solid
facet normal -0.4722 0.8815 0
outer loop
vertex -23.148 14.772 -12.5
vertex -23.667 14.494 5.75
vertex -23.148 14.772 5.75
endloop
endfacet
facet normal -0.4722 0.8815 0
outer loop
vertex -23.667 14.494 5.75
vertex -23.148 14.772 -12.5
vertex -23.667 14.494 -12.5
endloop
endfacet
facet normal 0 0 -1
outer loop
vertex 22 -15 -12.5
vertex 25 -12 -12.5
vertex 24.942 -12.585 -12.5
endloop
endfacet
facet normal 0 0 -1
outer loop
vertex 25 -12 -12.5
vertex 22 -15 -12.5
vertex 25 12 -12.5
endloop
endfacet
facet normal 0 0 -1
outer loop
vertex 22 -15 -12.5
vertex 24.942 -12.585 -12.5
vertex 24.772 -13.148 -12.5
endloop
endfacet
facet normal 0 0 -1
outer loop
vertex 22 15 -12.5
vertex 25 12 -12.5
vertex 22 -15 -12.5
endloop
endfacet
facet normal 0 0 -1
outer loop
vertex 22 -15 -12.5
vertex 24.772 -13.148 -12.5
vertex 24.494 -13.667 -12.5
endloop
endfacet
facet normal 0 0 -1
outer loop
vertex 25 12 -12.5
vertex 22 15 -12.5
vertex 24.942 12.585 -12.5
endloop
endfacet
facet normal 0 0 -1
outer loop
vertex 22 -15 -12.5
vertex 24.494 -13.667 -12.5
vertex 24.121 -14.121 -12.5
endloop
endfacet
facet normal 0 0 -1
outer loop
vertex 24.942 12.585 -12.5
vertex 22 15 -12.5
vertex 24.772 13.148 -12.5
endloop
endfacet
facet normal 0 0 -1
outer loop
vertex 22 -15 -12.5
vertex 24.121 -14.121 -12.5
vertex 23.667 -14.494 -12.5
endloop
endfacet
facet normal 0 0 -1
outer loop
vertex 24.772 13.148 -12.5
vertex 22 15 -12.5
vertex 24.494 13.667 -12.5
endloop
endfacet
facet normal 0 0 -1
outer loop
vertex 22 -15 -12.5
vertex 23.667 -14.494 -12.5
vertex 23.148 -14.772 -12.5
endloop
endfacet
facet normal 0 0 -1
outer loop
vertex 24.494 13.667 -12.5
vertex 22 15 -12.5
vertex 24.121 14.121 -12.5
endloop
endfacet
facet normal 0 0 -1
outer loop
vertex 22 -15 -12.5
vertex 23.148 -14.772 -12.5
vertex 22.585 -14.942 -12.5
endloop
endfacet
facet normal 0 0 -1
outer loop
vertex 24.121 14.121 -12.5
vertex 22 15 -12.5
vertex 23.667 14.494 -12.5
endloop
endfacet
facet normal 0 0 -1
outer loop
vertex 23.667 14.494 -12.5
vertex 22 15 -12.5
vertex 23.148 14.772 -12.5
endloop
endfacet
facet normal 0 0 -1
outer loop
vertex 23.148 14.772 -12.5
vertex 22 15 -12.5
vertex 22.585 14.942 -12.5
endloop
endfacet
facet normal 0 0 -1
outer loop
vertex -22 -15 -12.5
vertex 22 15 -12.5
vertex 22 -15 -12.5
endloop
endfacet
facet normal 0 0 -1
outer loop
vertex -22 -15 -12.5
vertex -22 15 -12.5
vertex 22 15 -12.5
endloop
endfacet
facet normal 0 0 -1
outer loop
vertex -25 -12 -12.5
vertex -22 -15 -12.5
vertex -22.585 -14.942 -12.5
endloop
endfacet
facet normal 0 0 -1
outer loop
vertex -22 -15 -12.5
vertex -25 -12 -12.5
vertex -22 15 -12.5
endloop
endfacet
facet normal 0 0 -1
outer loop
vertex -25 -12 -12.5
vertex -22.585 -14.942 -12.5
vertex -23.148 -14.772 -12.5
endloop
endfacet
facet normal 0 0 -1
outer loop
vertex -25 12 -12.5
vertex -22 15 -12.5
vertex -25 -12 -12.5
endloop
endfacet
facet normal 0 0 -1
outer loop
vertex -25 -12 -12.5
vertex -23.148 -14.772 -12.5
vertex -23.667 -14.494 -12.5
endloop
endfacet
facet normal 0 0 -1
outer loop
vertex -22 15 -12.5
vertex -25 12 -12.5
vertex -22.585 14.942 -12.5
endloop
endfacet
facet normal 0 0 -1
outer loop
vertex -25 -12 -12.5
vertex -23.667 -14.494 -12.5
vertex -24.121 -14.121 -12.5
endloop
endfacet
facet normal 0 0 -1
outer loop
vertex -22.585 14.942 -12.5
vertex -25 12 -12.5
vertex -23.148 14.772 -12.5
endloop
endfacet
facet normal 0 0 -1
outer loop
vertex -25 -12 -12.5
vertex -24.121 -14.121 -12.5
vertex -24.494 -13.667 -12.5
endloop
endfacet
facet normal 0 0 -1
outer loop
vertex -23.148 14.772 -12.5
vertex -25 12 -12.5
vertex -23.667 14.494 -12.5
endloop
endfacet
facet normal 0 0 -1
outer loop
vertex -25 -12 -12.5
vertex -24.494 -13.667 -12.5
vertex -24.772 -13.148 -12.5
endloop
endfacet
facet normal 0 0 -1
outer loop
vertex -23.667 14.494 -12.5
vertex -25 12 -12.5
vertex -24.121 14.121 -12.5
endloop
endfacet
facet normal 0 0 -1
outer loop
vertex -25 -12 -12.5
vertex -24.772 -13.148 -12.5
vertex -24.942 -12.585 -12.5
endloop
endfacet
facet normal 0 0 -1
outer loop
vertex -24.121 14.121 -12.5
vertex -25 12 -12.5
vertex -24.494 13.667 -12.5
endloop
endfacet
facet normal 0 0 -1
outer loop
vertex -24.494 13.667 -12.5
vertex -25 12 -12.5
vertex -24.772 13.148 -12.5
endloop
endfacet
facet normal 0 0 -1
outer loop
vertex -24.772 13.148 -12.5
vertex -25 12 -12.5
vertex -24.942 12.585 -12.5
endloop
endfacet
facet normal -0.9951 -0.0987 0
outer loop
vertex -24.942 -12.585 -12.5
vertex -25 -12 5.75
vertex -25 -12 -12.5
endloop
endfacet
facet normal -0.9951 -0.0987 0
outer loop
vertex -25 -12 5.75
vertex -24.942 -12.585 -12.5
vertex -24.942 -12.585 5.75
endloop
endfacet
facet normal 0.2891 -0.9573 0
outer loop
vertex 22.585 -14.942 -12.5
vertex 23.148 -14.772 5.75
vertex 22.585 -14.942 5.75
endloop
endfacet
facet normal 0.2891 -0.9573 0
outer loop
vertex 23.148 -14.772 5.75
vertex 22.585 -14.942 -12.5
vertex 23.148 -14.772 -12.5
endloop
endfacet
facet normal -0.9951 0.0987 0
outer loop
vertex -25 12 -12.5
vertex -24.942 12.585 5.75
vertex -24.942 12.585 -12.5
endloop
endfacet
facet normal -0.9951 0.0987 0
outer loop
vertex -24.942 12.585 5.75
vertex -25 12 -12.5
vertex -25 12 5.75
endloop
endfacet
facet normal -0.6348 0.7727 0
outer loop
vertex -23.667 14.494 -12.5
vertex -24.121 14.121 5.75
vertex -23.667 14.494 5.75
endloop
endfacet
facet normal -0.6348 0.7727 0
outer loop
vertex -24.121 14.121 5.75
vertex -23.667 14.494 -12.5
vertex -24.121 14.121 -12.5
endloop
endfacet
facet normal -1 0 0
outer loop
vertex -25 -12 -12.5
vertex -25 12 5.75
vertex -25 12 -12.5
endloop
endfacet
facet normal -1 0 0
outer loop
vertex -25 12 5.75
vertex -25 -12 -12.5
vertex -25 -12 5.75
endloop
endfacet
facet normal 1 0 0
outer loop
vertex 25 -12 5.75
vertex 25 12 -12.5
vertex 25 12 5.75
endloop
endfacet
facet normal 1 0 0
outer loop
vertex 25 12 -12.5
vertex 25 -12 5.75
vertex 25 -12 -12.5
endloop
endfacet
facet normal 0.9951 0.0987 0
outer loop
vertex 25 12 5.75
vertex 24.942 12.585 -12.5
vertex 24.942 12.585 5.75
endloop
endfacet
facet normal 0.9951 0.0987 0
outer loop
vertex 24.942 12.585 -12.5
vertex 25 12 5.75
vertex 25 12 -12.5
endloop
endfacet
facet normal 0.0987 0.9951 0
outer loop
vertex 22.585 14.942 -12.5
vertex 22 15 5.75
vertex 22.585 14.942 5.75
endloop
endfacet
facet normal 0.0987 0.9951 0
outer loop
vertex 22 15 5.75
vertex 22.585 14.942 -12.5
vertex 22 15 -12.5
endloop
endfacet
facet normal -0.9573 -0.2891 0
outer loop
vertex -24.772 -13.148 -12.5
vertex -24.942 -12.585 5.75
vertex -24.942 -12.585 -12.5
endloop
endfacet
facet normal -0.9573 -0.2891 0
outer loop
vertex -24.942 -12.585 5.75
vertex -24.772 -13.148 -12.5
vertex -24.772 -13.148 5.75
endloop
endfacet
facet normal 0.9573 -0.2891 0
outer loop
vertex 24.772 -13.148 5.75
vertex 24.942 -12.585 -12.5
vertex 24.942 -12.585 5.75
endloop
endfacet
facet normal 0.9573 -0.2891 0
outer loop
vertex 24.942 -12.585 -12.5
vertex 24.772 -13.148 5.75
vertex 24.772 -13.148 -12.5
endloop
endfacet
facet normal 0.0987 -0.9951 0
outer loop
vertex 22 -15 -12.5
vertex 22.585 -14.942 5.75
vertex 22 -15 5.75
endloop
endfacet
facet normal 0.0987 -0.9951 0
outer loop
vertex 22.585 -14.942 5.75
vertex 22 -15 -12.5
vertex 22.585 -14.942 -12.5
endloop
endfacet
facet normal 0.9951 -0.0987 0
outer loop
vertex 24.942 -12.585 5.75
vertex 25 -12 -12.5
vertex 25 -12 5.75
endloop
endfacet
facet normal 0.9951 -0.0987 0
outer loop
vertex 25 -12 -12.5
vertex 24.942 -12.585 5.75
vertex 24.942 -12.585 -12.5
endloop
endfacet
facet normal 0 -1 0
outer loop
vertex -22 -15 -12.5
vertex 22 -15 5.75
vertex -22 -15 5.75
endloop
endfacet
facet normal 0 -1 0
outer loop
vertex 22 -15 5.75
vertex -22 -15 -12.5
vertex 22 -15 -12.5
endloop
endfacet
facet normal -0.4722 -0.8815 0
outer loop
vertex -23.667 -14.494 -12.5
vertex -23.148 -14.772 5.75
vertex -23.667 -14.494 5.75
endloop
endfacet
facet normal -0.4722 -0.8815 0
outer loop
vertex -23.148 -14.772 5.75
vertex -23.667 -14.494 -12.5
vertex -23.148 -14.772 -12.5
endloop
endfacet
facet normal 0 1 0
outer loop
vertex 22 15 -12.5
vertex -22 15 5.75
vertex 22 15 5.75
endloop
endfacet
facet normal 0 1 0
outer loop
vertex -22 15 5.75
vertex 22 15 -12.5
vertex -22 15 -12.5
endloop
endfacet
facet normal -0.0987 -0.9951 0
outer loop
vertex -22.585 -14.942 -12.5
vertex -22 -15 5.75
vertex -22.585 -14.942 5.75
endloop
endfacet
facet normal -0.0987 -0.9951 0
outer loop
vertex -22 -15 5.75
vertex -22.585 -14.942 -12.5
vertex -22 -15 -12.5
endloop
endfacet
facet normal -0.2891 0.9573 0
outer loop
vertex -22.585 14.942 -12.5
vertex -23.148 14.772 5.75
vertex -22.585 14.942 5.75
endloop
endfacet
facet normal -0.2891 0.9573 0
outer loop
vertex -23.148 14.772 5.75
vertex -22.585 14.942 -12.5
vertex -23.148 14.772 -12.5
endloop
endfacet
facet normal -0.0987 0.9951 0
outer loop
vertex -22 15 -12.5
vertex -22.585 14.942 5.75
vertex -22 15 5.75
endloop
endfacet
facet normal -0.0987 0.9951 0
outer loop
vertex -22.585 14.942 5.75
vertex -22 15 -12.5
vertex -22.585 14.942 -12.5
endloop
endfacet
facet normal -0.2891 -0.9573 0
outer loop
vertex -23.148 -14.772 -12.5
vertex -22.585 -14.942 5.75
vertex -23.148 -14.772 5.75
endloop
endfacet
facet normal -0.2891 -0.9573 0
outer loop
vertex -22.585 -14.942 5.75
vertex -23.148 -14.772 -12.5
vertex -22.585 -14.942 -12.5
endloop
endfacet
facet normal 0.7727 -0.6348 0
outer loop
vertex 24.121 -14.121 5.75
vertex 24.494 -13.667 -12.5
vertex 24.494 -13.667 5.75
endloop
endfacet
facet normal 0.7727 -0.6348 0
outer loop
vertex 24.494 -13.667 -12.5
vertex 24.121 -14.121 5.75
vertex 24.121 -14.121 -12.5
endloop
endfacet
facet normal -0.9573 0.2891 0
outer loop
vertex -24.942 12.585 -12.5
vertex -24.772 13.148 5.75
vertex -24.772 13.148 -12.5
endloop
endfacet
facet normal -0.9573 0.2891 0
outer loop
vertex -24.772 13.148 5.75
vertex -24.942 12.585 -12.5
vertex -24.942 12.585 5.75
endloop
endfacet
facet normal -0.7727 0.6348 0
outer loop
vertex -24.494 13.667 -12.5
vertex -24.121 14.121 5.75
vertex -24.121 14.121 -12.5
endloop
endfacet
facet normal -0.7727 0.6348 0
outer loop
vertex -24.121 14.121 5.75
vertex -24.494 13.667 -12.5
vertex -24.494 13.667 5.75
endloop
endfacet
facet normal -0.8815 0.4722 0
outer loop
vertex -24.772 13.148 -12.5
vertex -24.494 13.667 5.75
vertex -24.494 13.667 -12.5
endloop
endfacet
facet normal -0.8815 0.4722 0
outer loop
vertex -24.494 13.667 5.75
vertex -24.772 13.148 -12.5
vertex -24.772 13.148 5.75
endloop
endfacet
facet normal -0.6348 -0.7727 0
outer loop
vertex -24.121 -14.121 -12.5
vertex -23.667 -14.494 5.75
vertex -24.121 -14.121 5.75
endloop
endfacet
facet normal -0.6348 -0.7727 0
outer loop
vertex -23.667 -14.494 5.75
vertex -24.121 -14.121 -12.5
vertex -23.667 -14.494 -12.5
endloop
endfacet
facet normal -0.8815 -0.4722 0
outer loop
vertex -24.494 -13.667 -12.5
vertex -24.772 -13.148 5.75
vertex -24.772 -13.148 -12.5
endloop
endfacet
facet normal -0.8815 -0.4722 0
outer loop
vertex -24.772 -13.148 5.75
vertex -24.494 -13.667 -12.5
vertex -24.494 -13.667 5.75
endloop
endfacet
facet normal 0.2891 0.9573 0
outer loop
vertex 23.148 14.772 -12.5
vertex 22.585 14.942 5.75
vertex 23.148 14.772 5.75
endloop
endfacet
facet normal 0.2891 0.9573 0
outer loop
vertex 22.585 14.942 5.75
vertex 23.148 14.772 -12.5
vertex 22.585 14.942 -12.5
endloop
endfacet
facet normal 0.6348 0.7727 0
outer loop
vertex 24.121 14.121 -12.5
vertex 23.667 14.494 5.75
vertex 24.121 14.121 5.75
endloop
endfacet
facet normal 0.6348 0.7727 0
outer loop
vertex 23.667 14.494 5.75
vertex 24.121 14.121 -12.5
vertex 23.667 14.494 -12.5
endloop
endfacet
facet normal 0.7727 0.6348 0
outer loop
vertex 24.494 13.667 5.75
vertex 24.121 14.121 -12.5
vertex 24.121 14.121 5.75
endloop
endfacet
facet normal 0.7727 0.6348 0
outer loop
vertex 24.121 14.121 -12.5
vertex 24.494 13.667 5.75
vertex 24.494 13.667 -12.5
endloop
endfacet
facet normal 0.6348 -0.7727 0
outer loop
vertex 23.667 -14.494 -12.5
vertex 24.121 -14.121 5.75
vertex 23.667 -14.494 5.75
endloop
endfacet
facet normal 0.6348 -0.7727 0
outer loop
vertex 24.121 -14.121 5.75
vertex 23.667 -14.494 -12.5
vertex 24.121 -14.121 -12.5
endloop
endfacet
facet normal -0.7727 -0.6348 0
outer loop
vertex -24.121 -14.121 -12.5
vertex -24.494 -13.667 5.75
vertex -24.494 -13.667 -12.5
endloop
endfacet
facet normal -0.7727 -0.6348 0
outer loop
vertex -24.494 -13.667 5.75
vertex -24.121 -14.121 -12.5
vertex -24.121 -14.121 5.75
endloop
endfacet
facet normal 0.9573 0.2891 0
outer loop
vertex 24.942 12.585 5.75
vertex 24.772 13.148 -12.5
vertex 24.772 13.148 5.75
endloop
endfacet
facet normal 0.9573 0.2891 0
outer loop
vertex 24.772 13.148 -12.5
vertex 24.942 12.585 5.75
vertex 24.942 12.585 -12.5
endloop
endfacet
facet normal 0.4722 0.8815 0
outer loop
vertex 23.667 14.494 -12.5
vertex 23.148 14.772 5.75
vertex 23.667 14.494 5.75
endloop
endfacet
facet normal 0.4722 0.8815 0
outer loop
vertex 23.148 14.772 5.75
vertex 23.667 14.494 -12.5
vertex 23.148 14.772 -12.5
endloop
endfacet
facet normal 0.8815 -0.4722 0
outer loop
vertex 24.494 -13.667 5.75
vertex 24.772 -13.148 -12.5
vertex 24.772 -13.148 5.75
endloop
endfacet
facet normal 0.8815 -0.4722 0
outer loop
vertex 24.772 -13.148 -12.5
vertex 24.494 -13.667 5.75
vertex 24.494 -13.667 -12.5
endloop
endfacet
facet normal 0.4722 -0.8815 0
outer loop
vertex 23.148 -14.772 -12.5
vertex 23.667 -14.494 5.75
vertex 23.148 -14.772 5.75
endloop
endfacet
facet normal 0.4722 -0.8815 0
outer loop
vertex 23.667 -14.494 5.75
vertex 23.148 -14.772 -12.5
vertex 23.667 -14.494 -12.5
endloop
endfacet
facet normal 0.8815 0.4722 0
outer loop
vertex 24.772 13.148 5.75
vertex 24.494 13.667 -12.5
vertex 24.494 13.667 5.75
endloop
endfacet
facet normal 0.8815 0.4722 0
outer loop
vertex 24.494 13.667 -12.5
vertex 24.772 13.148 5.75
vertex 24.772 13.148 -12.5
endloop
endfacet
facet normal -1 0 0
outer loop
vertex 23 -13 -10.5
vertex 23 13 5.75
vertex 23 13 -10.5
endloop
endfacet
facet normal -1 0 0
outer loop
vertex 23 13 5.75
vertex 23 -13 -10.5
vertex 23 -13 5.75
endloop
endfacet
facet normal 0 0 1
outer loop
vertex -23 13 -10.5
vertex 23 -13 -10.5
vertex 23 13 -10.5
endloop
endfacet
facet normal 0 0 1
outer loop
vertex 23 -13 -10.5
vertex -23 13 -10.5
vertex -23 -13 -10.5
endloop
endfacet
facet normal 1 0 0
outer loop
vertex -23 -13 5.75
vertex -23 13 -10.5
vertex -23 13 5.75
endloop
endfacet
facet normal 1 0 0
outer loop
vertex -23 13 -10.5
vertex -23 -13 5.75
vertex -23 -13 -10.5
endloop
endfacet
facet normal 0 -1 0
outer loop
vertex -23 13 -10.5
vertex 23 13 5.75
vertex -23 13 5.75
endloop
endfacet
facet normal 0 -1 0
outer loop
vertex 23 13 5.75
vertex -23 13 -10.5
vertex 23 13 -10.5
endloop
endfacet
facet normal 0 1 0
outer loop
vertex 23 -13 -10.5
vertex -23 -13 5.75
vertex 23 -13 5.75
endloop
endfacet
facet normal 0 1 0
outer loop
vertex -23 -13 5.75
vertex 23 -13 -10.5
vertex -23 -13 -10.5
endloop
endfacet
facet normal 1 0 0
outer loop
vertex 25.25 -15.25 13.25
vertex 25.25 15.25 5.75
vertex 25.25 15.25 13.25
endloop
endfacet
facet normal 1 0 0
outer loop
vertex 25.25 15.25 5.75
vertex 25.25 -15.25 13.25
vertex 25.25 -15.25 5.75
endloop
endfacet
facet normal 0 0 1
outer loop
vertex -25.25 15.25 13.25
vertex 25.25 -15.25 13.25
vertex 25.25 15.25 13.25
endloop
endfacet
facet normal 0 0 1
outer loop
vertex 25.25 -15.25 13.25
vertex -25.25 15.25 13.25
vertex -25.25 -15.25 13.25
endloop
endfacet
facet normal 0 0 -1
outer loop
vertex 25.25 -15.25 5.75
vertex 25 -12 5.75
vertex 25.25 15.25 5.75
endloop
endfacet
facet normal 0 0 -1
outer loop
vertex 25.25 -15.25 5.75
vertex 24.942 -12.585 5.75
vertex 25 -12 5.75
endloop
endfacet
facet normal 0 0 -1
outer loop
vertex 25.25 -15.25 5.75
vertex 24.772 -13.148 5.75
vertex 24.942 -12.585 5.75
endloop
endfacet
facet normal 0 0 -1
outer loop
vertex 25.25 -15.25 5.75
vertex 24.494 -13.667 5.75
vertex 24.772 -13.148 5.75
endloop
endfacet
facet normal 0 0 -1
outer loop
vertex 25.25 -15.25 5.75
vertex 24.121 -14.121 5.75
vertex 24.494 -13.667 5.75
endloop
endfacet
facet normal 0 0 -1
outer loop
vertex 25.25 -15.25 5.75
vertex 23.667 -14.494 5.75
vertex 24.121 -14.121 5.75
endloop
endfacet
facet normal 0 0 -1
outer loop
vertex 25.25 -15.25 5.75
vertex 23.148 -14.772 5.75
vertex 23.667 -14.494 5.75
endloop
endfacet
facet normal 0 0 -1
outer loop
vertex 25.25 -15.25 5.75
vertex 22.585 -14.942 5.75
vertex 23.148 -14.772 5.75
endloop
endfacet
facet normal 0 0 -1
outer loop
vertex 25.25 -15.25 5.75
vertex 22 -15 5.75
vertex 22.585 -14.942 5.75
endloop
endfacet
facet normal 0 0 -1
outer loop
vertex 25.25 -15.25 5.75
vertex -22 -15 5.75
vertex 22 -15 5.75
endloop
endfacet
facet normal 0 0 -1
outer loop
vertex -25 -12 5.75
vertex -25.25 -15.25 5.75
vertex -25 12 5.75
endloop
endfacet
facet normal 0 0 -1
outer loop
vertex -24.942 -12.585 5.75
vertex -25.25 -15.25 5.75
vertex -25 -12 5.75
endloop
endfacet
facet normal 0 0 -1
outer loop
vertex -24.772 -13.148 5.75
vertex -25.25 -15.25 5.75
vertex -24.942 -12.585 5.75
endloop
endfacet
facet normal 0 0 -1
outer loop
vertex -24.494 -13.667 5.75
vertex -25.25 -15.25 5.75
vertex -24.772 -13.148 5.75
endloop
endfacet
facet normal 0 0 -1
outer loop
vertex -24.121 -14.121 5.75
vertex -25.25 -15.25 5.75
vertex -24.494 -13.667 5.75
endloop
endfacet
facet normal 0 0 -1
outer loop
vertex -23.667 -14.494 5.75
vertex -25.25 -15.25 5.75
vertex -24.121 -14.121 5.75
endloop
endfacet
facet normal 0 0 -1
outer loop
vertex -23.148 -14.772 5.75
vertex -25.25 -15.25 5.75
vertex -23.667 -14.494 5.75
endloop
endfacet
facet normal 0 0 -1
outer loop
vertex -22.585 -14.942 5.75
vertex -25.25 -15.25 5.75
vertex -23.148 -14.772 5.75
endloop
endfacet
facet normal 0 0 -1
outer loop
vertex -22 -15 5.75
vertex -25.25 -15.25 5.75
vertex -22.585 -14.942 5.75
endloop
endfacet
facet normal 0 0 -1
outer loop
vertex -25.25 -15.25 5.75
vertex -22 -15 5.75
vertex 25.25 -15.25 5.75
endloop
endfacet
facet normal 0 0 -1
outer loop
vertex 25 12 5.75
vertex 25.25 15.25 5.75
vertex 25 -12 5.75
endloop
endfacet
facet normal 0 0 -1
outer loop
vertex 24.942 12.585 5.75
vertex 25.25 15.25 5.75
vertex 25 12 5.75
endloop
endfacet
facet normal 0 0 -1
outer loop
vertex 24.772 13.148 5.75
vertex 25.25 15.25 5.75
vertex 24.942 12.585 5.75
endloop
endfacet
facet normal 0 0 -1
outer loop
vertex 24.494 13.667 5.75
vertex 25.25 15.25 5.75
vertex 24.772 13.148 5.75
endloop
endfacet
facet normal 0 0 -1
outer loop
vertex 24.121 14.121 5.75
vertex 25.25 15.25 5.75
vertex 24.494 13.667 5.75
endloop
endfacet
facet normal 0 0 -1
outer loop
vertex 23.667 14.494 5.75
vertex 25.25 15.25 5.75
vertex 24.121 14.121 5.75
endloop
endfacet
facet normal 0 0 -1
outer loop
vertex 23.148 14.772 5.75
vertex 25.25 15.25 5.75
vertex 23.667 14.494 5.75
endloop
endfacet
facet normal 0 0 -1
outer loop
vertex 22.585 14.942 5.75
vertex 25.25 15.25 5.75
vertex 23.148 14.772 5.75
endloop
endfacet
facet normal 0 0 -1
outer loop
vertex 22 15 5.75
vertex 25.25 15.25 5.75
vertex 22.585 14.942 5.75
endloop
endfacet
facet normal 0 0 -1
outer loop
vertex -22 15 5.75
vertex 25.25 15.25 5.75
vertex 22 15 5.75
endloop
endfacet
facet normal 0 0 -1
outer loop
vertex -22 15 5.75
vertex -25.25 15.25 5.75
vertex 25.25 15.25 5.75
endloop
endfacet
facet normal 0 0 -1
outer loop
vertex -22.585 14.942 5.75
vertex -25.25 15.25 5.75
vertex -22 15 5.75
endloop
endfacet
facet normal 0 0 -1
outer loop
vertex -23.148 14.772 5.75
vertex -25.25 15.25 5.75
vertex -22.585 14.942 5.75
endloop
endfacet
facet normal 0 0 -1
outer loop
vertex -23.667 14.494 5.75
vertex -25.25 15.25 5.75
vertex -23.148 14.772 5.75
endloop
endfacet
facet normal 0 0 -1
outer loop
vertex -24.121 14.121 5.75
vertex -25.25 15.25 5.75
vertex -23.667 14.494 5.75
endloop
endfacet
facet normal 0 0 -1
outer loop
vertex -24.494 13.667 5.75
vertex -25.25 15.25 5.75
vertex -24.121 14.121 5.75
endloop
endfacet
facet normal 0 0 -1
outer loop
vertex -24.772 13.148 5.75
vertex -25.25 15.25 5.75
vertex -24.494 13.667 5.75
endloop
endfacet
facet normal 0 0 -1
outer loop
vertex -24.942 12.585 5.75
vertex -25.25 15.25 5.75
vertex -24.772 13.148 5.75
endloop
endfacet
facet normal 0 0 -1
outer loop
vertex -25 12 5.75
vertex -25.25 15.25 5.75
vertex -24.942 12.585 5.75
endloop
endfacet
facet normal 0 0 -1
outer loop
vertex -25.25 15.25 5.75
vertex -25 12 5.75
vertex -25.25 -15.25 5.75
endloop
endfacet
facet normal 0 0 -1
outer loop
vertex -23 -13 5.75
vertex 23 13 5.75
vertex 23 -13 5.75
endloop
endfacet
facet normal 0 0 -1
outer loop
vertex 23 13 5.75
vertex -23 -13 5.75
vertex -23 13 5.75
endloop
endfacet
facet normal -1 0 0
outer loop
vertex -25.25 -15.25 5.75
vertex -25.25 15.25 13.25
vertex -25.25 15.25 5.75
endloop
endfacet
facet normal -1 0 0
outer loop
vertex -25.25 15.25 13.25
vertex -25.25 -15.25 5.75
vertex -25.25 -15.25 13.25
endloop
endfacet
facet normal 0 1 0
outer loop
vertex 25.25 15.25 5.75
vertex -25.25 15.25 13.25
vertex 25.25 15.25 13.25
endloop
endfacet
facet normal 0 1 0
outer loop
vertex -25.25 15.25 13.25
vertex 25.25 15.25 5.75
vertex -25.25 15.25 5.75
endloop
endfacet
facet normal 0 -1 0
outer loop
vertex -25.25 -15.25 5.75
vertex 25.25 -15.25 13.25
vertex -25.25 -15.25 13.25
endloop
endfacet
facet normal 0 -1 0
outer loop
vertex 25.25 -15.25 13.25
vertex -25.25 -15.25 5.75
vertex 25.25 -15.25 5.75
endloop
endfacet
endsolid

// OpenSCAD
// Parametric Box
// A simple customizable box with lid option

/* [Dimensions] */
// Width of the box
width = 50; // [10:200]
// Depth of the box
depth = 30; // [10:200]
// Height of the box
height = 25; // [5:100]

/* [Features] */
// Wall thickness
wall = 2; // [1:0.5:5]
// Add a lid
has_lid = true;
// Corner style
corner_style = "round"; // [round, sharp, chamfer]

/* [Advanced] */
// Corner radius (when round)
corner_radius = 3; // [1:10]
// Lid height ratio
lid_ratio = 0.3; // [0.1:0.05:0.5]

difference() {
    if (corner_style == "round") {
        minkowski() {
            cube([width - 2*corner_radius, depth - 2*corner_radius, height], center=true);
            cylinder(r=corner_radius, h=0.01, $fn=32);
        }
    } else if (corner_style == "chamfer") {
        hull() {
            translate([0, 0, 0])
                cube([width - 4, depth - 4, height], center=true);
        }
    } else {
        cube([width, depth, height], center=true);
    }

    translate([0, 0, wall])
        cube([width - 2*wall, depth - 2*wall, height], center=true);
}

if (has_lid) {
    translate([0, 0, height * lid_ratio + 2])
        cube([width + 0.5, depth + 0.5, height * lid_ratio], center=true);
}
